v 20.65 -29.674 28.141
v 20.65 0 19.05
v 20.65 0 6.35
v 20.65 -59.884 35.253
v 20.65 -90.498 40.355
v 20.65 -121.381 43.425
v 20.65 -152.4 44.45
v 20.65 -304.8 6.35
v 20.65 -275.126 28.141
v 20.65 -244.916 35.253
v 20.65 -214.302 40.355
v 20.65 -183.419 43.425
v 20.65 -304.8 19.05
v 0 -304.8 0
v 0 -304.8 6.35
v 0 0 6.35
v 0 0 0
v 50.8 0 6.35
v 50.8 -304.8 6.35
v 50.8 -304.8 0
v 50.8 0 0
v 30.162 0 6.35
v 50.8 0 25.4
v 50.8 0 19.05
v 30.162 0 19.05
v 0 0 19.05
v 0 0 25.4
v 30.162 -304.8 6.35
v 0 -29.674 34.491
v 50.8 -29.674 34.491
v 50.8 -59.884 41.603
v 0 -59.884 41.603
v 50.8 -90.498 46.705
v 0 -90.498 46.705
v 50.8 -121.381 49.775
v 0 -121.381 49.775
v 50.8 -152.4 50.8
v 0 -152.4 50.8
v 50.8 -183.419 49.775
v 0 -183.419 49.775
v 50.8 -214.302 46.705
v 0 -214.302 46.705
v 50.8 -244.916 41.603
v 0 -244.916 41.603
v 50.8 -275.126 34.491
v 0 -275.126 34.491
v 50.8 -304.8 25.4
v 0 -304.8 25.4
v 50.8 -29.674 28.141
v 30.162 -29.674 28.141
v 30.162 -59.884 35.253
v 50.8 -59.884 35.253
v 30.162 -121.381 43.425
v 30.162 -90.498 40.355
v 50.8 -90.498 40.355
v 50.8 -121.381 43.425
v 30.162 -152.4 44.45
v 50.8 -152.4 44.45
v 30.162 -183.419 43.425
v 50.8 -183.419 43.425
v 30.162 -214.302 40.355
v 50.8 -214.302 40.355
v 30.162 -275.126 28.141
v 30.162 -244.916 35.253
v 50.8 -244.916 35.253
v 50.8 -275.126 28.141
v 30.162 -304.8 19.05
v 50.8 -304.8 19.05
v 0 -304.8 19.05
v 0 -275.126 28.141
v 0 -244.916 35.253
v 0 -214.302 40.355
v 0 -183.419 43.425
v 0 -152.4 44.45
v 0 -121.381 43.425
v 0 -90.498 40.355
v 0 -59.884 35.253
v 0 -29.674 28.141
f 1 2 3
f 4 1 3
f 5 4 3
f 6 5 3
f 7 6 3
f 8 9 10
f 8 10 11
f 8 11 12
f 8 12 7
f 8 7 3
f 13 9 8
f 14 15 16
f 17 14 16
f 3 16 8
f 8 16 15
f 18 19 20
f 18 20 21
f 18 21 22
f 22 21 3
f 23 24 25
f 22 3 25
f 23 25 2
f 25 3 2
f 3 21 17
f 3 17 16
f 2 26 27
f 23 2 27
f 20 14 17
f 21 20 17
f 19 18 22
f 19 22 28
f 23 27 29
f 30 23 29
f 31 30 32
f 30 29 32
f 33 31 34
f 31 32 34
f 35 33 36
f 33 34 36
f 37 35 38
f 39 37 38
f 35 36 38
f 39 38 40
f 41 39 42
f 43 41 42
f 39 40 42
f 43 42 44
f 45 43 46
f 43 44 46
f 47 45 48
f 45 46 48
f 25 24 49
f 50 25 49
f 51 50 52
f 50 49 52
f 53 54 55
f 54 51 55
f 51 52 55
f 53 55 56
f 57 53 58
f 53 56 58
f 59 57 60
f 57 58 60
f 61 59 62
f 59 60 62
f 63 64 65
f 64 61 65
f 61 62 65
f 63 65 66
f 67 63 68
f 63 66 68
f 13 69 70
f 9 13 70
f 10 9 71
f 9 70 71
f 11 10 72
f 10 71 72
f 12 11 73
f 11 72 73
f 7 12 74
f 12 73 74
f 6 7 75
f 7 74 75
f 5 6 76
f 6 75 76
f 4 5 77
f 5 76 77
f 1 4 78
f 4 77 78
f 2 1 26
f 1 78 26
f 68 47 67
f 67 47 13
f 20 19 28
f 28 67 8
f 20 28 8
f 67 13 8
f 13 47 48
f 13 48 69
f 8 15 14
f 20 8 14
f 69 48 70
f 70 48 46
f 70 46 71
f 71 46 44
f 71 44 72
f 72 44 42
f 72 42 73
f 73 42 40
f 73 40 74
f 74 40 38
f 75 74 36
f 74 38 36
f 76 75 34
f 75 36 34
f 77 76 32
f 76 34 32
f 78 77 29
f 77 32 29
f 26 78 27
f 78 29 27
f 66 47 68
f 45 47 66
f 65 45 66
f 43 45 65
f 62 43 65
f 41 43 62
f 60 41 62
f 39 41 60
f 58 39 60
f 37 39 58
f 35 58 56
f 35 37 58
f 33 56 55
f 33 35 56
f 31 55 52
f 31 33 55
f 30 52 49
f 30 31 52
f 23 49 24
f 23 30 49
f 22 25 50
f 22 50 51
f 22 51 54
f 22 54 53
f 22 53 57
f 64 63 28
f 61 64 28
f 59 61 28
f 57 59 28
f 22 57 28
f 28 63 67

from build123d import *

# Parameters (mm, degrees)
F0_W     = 304.8
F0_H     = 6.35
F1_DEPTH = 50.8
F3_DEPTH = 0.8125
F5_DEPTH = 20.6502


# Not quite as in the source:
# - a pattern or mirror of a feature is missing from the dataset's text; its kind, count and spacing are read off the source's solid


with BuildPart() as f1:
    # F0 (on Right) → F1 (new body)
    with BuildSketch(Plane.YZ):
        with BuildLine():
            Line((-304.8, 6.35), (0, 6.35))
            Line((0, 6.35), (0, 19.05))
            ThreePointArc((0, 19.05), (-152.4, 44.45), (-304.8, 19.05))
            Line((-304.8, 19.05), (-304.8, 6.35))
        make_face()
        with BuildLine():
            ThreePointArc((-304.8, 19.05), (-152.4, 44.45), (0, 19.05))
            Line((0, 19.05), (0, 25.4))
            ThreePointArc((0, 25.4), (-152.4, 50.8), (-304.8, 25.4))
            Line((-304.8, 25.4), (-304.8, 19.05))
        make_face()
        with Locations((-152.4, 3.175)):
            Rectangle(F0_W, F0_H)
    extrude(amount=F1_DEPTH)

    # F2 (on face) → F3 (cut)
    with BuildSketch(Plane.YZ.offset(50.8)):
        with BuildLine():
            Line((0, 6.35), (0, 19.05))
            ThreePointArc((0, 19.05), (-152.4, 44.45), (-304.8, 19.05))
            Line((-304.8, 19.05), (-304.8, 6.35))
            Line((-304.8, 6.35), (0, 6.35))
        make_face()
    extrude(amount=-F3_DEPTH, mode=Mode.SUBTRACT)

    # F4 (on face) → F5 (cut)
    with BuildSketch(Plane(origin=(0, 0, 0), x_dir=(0, -1, 0), z_dir=(-1, 0, 0))):
        with BuildLine():
            Line((304.8, 6.35), (304.8, 19.05))
            ThreePointArc((304.8, 19.05), (152.4, 44.45), (0, 19.05))
            Line((0, 19.05), (0, 6.35))
            Line((0, 6.35), (304.8, 6.35))
        make_face()
    f5 = extrude(amount=-F5_DEPTH, mode=Mode.SUBTRACT)

    # F5_copies: F5 across plane
    add(f5.mirror(Plane(origin=(25.40635, 0, 0), x_dir=(0, 0, 1), z_dir=(1, 0, 0))), mode=Mode.SUBTRACT)


solid = f1.part
